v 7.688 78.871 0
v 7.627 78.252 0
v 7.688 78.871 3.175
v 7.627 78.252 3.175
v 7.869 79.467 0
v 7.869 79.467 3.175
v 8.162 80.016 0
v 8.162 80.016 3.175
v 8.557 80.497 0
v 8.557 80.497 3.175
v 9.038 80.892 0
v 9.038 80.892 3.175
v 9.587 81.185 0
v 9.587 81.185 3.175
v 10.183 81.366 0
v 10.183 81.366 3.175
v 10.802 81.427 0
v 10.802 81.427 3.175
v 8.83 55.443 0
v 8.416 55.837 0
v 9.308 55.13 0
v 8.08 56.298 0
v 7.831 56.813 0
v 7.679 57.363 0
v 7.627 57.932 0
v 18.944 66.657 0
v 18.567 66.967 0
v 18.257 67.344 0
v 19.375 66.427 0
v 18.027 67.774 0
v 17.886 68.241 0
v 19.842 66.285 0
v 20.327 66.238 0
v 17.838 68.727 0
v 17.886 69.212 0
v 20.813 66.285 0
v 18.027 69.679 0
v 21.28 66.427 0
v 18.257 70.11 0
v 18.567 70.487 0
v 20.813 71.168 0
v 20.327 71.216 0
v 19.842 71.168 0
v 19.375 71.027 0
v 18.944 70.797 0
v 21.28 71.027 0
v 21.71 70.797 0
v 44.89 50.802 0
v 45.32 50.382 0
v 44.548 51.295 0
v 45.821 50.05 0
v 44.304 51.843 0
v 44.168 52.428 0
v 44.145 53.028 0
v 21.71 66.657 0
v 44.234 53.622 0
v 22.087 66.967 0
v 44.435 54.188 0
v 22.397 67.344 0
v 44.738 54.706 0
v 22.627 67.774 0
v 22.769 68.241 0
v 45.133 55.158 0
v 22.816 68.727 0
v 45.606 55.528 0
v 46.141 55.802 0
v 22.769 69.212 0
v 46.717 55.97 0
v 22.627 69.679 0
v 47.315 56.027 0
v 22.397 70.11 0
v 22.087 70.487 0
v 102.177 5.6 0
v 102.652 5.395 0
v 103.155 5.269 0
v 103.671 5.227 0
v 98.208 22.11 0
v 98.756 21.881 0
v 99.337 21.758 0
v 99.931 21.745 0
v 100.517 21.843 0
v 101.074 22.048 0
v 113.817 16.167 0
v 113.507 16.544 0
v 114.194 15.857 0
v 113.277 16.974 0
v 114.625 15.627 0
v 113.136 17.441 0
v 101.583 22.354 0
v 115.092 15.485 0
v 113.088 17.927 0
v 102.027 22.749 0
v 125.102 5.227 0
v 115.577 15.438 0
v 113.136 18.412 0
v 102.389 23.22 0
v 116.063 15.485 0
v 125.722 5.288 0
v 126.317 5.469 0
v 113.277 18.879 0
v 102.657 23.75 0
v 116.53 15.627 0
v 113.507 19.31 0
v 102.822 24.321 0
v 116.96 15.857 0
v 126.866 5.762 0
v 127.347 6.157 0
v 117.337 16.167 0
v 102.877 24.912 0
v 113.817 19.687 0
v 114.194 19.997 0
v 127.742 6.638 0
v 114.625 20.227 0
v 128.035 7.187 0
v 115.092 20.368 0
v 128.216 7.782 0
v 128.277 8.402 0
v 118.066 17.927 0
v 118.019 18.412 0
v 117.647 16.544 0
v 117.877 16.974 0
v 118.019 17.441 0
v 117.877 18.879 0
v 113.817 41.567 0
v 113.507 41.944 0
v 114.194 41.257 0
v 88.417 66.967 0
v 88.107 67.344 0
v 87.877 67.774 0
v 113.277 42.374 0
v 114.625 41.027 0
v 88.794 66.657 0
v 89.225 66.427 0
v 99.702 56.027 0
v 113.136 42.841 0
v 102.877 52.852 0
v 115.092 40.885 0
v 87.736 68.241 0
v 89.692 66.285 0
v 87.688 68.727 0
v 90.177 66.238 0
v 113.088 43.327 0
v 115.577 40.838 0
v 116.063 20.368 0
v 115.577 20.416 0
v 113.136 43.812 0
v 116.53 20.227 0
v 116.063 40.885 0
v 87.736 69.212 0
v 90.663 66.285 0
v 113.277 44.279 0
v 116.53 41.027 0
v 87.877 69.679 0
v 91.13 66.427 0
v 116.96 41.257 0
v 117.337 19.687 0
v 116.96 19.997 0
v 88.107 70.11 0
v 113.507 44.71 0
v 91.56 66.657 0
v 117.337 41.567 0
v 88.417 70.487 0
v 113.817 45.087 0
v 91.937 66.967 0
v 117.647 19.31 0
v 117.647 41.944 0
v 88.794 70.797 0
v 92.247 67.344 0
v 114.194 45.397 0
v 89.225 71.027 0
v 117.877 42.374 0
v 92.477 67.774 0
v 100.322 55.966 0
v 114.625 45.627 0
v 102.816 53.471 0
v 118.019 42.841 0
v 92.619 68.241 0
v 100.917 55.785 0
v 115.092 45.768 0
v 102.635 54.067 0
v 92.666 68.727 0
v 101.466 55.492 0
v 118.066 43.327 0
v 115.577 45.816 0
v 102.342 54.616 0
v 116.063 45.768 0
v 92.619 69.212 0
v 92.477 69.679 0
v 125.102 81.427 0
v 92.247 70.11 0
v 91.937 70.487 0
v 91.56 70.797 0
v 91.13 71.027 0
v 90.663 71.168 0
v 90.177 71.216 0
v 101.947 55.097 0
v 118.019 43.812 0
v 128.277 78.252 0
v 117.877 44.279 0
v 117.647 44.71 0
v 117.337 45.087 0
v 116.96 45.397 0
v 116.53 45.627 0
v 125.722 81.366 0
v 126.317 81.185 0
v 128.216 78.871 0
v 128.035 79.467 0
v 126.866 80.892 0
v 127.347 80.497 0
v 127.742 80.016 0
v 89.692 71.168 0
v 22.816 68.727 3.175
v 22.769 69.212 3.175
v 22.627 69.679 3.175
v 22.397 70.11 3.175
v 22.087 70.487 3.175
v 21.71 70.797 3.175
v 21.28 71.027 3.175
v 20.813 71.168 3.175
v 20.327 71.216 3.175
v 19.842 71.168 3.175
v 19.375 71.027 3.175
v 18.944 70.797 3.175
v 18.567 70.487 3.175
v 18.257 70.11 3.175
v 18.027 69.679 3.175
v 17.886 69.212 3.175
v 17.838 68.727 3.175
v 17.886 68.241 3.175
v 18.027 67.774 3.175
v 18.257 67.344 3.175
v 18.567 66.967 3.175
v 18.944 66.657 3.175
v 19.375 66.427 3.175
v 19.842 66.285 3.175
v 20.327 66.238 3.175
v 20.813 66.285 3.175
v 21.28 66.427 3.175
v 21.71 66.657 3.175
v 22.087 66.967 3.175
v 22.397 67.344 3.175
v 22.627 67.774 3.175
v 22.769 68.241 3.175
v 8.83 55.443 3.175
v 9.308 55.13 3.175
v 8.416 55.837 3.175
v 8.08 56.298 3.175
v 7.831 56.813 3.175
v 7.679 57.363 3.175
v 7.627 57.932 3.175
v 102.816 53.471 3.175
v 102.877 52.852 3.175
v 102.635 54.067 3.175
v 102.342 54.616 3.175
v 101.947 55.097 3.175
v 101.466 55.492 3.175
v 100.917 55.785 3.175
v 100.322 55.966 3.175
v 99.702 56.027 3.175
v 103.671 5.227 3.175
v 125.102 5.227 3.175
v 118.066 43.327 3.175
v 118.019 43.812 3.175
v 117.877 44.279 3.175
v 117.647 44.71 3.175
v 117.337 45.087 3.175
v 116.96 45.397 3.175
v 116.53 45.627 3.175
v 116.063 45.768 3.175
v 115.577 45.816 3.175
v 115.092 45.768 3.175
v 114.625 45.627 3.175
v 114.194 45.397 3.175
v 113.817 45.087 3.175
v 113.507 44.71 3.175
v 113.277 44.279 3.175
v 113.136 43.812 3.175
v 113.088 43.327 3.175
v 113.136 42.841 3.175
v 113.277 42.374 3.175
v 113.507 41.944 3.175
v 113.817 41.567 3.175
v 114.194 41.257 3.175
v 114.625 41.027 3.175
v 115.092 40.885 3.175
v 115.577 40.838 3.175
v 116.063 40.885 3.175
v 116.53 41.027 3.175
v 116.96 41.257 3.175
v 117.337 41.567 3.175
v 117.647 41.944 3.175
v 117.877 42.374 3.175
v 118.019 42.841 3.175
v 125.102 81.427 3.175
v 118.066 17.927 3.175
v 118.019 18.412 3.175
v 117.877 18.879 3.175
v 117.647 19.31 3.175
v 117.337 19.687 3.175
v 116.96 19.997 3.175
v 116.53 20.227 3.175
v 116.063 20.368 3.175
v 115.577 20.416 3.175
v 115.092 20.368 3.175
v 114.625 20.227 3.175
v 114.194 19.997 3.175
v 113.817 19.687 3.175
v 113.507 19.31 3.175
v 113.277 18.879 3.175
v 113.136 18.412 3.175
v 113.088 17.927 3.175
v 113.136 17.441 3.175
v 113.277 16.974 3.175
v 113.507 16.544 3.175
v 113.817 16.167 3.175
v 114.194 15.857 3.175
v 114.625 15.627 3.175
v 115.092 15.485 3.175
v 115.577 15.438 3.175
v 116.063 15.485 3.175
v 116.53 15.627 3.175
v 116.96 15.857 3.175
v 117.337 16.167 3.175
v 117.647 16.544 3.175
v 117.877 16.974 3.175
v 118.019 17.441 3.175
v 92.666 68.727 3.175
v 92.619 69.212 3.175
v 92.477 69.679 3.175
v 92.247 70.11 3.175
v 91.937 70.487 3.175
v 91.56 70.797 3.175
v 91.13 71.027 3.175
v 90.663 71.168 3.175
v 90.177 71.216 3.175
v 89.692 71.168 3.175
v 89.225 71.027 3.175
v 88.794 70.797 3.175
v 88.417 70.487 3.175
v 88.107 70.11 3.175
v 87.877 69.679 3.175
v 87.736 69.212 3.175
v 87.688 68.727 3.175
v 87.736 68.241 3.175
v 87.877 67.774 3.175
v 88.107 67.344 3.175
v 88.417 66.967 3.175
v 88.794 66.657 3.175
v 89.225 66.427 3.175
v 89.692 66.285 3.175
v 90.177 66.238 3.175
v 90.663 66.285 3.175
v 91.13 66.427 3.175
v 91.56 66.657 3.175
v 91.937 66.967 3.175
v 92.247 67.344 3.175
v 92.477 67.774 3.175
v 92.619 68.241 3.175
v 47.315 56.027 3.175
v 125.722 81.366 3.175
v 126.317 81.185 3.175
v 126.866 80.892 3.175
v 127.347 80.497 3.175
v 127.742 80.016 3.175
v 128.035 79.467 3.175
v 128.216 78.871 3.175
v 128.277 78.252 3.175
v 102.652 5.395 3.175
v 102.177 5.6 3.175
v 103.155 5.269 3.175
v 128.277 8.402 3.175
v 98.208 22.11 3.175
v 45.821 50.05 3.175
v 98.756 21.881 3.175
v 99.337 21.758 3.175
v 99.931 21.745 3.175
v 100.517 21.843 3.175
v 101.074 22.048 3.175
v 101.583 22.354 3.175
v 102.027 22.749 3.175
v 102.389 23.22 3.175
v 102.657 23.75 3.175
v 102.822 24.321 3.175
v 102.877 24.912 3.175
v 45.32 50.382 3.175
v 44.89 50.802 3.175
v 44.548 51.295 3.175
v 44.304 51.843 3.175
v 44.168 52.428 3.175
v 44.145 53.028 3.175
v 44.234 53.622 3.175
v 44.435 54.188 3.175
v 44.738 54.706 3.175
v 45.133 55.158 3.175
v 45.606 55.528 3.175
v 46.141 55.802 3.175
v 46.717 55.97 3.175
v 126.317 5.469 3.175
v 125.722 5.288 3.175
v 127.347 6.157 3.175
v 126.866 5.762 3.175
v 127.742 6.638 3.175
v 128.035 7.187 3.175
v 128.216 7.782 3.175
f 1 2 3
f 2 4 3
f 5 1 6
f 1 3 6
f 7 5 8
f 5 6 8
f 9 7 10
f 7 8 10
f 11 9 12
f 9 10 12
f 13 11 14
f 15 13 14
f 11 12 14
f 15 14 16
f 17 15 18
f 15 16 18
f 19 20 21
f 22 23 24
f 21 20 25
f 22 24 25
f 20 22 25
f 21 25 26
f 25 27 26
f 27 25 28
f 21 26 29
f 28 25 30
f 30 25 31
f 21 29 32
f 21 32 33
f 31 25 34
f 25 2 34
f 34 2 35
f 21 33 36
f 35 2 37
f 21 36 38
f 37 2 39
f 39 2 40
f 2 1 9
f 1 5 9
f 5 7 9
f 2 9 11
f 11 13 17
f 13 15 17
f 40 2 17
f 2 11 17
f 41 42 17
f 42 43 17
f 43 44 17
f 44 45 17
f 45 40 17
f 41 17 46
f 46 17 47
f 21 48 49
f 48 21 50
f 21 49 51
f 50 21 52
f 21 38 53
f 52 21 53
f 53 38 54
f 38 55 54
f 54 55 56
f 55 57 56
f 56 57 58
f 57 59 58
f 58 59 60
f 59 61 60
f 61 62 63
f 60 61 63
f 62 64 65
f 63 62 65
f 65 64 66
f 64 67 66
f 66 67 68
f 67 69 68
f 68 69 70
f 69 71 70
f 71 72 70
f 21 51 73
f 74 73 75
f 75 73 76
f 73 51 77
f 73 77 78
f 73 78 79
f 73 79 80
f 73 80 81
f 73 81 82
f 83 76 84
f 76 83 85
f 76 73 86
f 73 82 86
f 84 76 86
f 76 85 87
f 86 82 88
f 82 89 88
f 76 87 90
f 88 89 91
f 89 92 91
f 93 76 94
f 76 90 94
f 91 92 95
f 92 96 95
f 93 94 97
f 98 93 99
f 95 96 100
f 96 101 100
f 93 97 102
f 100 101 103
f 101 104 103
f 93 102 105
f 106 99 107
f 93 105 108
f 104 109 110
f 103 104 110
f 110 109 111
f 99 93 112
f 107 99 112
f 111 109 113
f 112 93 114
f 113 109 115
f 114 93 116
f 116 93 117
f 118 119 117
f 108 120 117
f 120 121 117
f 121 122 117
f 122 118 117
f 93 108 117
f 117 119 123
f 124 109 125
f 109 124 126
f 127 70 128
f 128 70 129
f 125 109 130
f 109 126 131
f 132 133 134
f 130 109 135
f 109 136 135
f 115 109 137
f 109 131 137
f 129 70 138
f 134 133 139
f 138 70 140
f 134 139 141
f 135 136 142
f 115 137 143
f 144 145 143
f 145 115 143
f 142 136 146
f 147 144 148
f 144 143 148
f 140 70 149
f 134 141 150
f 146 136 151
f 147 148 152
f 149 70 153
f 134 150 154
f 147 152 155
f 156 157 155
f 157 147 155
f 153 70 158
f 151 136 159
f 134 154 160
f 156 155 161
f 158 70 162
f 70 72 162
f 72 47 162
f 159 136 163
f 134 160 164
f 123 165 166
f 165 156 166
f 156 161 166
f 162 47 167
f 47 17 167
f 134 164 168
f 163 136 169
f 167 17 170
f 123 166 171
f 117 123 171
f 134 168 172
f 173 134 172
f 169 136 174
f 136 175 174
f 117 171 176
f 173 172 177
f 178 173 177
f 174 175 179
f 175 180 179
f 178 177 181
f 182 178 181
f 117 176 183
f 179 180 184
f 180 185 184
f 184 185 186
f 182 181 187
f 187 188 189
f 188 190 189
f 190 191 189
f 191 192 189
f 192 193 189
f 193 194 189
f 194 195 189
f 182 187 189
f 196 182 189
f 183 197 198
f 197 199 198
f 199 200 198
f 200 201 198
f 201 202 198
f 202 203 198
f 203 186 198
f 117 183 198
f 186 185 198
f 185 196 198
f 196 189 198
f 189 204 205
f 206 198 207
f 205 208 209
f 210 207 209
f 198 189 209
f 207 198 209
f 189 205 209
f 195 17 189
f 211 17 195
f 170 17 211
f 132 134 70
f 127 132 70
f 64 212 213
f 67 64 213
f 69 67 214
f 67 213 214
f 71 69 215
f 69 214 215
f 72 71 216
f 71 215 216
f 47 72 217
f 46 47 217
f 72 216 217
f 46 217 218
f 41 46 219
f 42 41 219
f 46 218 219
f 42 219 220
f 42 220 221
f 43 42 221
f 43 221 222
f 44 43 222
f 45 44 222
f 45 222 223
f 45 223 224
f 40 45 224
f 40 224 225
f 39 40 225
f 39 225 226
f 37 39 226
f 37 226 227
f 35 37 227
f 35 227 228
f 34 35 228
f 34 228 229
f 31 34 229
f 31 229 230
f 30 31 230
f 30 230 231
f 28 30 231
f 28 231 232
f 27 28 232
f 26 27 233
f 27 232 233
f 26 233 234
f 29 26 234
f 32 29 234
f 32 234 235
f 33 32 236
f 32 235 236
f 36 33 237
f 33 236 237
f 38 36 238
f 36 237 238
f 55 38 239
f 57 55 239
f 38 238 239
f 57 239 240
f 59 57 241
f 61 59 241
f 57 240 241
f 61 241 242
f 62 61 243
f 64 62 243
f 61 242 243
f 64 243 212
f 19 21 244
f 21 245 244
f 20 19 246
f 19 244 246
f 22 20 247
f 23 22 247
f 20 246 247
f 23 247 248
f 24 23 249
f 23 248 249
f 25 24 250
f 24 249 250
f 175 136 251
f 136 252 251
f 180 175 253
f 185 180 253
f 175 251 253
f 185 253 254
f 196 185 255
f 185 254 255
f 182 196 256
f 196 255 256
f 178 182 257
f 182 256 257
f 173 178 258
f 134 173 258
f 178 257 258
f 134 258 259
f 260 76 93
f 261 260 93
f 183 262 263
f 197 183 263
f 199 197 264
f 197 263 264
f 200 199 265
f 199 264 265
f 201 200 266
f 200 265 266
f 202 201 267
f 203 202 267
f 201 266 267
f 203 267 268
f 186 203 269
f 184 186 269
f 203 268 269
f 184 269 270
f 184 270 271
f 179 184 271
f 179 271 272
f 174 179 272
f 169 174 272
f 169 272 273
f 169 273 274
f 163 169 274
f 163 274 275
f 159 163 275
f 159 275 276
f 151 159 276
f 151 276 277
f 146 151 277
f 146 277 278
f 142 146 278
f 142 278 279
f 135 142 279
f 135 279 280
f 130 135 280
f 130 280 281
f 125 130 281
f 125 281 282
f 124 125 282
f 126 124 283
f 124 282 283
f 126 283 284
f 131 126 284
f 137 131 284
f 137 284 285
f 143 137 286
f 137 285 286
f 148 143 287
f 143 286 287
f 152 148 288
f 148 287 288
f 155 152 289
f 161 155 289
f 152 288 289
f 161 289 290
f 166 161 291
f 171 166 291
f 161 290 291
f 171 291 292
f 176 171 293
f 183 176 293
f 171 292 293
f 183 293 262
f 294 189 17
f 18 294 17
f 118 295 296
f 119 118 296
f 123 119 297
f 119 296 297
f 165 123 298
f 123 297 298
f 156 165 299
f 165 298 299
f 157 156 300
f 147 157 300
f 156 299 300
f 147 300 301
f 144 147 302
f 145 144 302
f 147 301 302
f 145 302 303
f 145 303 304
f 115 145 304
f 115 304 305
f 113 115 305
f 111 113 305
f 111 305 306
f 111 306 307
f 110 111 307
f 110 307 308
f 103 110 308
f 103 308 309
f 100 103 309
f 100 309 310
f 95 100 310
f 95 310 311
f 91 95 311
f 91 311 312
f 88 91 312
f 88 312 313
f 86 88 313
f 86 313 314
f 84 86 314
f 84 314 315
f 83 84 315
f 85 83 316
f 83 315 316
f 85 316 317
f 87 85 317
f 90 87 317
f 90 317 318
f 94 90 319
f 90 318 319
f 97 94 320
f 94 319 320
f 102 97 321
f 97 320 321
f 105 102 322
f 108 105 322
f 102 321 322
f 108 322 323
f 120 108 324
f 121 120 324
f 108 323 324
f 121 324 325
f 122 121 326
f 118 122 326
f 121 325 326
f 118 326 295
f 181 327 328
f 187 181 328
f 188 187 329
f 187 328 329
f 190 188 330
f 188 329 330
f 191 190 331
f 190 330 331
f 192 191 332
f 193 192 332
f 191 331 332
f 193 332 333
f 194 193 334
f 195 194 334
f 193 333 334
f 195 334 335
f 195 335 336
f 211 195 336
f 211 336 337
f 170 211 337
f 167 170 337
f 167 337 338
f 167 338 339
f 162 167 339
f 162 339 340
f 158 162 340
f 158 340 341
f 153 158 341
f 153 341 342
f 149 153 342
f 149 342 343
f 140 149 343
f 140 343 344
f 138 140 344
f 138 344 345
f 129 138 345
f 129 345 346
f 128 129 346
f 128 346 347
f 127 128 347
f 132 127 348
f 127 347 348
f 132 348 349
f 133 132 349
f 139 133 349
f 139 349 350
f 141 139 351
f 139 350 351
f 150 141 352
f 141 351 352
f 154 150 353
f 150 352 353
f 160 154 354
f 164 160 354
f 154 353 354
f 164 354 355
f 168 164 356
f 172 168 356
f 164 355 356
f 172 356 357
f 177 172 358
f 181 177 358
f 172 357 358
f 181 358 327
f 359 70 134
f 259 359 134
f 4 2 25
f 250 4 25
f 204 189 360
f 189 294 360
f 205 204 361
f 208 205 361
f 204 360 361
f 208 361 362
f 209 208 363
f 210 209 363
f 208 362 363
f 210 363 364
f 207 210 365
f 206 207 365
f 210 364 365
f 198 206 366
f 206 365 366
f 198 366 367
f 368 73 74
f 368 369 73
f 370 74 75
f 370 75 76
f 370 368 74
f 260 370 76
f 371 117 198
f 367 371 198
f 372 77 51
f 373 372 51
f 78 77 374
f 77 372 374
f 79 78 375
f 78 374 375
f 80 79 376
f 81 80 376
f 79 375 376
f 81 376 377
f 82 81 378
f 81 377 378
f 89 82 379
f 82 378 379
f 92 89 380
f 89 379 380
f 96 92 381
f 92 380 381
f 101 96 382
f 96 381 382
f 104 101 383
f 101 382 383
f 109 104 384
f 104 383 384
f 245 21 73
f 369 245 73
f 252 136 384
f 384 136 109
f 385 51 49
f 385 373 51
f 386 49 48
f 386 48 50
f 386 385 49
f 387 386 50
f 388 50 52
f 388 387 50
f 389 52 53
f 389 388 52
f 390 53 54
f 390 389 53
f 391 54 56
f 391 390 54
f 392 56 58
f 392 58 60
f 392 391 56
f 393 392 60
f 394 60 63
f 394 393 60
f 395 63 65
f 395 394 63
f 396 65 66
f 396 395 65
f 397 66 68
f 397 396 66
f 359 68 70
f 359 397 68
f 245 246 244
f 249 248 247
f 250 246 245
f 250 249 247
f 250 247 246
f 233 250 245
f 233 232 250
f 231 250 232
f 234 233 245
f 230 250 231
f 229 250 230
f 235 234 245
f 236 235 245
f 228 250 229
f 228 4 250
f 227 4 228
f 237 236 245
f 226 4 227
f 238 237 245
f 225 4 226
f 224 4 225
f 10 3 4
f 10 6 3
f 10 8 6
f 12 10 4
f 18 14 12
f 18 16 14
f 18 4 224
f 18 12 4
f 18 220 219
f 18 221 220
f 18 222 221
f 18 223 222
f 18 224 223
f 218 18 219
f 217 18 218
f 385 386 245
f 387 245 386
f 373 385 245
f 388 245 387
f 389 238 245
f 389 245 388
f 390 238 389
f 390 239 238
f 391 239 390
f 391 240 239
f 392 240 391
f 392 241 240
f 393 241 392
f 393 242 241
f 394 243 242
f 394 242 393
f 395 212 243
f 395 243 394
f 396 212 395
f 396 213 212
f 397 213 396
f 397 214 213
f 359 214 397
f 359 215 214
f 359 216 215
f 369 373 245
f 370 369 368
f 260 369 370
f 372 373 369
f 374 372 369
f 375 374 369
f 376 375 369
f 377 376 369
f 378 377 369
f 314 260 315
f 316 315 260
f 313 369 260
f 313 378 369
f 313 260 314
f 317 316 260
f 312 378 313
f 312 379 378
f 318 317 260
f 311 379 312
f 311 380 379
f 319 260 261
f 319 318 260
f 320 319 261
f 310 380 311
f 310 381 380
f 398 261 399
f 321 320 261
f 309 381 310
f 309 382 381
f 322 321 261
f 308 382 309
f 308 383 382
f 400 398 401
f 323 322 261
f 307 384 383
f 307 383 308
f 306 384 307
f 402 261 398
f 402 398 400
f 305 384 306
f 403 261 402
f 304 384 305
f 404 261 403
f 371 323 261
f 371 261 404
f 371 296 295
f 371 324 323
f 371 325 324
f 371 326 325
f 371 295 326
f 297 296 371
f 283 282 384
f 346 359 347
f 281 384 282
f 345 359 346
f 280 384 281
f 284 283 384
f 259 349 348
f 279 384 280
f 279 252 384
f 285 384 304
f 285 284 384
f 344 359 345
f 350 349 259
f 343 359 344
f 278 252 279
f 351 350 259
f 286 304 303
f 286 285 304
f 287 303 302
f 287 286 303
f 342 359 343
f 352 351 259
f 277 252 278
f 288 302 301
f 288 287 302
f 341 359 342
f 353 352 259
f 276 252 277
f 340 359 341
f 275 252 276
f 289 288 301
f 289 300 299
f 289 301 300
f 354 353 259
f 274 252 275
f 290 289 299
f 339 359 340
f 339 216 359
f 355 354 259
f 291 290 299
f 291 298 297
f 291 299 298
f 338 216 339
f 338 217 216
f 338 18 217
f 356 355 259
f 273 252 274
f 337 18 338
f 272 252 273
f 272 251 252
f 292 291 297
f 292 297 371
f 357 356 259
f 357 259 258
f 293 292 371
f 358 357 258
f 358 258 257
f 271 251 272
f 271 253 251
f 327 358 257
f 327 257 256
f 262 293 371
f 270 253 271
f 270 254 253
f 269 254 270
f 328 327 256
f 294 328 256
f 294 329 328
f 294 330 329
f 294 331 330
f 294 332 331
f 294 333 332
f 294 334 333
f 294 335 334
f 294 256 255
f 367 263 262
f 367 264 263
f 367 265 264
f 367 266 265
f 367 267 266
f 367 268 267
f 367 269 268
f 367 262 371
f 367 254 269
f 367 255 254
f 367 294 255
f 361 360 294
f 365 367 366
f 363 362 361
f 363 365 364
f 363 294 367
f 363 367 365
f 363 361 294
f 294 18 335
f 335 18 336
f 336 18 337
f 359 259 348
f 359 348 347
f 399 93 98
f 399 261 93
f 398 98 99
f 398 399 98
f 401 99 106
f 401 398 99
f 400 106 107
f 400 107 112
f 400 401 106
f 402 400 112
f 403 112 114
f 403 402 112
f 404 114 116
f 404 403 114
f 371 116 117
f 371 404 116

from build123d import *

# Parameters (mm, degrees)
BOSS_EXTRUDE1_DEPTH = 3.175
SKETCH2_R           = 2.4892
CUT_EXTRUDE1_DEPTH  = 152.971856141
FILLET1_R           = 3.175


with BuildPart() as part:
    # Sketch1 → Boss-Extrude1 (new body)
    with BuildSketch(Plane.XY):
        Polygon((7.627179371, 56.026836403), (102.877179371, 5.226836403), (128.277179371, 5.226836403), (128.277179371, 81.426836403), (7.627179371, 81.426836403), align=None)
        Polygon((34.614679371, 56.026836403), (102.877179371, 56.026836403), (102.877179371, 19.620169736), align=None, mode=Mode.SUBTRACT)
    extrude(amount=BOSS_EXTRUDE1_DEPTH)

    # Sketch2 → Cut-Extrude1 (cut, through all)
    with BuildSketch(Plane.XY.offset(3.175)):
        with Locations((115.577179371, 43.326836403)):
            Circle(SKETCH2_R)
        with Locations((115.577179371, 17.926836403)):
            Circle(SKETCH2_R)
        with Locations((90.177179371, 68.726836403)):
            Circle(SKETCH2_R)
        with Locations((20.327179371, 68.726836403)):
            Circle(SKETCH2_R)
    extrude(amount=-CUT_EXTRUDE1_DEPTH, mode=Mode.SUBTRACT)

    # Fillet1
    fillet1_edges = [part.edges().sort_by_distance(p)[0] for p in [
        (34.614679371, 56.026836403, 1.5875),
        (102.877179371, 19.620169736, 1.5875),
        (102.877179371, 56.026836403, 1.5875),
        (128.277179371, 5.226836403, 1.5875),
        (102.877179371, 5.226836403, 1.5875),
        (7.627179371, 56.026836403, 1.5875),
        (7.627179371, 81.426836403, 1.5875),
        (128.277179371, 81.426836403, 1.5875),
    ]]
    fillet(fillet1_edges, radius=FILLET1_R)


solid = part.part
